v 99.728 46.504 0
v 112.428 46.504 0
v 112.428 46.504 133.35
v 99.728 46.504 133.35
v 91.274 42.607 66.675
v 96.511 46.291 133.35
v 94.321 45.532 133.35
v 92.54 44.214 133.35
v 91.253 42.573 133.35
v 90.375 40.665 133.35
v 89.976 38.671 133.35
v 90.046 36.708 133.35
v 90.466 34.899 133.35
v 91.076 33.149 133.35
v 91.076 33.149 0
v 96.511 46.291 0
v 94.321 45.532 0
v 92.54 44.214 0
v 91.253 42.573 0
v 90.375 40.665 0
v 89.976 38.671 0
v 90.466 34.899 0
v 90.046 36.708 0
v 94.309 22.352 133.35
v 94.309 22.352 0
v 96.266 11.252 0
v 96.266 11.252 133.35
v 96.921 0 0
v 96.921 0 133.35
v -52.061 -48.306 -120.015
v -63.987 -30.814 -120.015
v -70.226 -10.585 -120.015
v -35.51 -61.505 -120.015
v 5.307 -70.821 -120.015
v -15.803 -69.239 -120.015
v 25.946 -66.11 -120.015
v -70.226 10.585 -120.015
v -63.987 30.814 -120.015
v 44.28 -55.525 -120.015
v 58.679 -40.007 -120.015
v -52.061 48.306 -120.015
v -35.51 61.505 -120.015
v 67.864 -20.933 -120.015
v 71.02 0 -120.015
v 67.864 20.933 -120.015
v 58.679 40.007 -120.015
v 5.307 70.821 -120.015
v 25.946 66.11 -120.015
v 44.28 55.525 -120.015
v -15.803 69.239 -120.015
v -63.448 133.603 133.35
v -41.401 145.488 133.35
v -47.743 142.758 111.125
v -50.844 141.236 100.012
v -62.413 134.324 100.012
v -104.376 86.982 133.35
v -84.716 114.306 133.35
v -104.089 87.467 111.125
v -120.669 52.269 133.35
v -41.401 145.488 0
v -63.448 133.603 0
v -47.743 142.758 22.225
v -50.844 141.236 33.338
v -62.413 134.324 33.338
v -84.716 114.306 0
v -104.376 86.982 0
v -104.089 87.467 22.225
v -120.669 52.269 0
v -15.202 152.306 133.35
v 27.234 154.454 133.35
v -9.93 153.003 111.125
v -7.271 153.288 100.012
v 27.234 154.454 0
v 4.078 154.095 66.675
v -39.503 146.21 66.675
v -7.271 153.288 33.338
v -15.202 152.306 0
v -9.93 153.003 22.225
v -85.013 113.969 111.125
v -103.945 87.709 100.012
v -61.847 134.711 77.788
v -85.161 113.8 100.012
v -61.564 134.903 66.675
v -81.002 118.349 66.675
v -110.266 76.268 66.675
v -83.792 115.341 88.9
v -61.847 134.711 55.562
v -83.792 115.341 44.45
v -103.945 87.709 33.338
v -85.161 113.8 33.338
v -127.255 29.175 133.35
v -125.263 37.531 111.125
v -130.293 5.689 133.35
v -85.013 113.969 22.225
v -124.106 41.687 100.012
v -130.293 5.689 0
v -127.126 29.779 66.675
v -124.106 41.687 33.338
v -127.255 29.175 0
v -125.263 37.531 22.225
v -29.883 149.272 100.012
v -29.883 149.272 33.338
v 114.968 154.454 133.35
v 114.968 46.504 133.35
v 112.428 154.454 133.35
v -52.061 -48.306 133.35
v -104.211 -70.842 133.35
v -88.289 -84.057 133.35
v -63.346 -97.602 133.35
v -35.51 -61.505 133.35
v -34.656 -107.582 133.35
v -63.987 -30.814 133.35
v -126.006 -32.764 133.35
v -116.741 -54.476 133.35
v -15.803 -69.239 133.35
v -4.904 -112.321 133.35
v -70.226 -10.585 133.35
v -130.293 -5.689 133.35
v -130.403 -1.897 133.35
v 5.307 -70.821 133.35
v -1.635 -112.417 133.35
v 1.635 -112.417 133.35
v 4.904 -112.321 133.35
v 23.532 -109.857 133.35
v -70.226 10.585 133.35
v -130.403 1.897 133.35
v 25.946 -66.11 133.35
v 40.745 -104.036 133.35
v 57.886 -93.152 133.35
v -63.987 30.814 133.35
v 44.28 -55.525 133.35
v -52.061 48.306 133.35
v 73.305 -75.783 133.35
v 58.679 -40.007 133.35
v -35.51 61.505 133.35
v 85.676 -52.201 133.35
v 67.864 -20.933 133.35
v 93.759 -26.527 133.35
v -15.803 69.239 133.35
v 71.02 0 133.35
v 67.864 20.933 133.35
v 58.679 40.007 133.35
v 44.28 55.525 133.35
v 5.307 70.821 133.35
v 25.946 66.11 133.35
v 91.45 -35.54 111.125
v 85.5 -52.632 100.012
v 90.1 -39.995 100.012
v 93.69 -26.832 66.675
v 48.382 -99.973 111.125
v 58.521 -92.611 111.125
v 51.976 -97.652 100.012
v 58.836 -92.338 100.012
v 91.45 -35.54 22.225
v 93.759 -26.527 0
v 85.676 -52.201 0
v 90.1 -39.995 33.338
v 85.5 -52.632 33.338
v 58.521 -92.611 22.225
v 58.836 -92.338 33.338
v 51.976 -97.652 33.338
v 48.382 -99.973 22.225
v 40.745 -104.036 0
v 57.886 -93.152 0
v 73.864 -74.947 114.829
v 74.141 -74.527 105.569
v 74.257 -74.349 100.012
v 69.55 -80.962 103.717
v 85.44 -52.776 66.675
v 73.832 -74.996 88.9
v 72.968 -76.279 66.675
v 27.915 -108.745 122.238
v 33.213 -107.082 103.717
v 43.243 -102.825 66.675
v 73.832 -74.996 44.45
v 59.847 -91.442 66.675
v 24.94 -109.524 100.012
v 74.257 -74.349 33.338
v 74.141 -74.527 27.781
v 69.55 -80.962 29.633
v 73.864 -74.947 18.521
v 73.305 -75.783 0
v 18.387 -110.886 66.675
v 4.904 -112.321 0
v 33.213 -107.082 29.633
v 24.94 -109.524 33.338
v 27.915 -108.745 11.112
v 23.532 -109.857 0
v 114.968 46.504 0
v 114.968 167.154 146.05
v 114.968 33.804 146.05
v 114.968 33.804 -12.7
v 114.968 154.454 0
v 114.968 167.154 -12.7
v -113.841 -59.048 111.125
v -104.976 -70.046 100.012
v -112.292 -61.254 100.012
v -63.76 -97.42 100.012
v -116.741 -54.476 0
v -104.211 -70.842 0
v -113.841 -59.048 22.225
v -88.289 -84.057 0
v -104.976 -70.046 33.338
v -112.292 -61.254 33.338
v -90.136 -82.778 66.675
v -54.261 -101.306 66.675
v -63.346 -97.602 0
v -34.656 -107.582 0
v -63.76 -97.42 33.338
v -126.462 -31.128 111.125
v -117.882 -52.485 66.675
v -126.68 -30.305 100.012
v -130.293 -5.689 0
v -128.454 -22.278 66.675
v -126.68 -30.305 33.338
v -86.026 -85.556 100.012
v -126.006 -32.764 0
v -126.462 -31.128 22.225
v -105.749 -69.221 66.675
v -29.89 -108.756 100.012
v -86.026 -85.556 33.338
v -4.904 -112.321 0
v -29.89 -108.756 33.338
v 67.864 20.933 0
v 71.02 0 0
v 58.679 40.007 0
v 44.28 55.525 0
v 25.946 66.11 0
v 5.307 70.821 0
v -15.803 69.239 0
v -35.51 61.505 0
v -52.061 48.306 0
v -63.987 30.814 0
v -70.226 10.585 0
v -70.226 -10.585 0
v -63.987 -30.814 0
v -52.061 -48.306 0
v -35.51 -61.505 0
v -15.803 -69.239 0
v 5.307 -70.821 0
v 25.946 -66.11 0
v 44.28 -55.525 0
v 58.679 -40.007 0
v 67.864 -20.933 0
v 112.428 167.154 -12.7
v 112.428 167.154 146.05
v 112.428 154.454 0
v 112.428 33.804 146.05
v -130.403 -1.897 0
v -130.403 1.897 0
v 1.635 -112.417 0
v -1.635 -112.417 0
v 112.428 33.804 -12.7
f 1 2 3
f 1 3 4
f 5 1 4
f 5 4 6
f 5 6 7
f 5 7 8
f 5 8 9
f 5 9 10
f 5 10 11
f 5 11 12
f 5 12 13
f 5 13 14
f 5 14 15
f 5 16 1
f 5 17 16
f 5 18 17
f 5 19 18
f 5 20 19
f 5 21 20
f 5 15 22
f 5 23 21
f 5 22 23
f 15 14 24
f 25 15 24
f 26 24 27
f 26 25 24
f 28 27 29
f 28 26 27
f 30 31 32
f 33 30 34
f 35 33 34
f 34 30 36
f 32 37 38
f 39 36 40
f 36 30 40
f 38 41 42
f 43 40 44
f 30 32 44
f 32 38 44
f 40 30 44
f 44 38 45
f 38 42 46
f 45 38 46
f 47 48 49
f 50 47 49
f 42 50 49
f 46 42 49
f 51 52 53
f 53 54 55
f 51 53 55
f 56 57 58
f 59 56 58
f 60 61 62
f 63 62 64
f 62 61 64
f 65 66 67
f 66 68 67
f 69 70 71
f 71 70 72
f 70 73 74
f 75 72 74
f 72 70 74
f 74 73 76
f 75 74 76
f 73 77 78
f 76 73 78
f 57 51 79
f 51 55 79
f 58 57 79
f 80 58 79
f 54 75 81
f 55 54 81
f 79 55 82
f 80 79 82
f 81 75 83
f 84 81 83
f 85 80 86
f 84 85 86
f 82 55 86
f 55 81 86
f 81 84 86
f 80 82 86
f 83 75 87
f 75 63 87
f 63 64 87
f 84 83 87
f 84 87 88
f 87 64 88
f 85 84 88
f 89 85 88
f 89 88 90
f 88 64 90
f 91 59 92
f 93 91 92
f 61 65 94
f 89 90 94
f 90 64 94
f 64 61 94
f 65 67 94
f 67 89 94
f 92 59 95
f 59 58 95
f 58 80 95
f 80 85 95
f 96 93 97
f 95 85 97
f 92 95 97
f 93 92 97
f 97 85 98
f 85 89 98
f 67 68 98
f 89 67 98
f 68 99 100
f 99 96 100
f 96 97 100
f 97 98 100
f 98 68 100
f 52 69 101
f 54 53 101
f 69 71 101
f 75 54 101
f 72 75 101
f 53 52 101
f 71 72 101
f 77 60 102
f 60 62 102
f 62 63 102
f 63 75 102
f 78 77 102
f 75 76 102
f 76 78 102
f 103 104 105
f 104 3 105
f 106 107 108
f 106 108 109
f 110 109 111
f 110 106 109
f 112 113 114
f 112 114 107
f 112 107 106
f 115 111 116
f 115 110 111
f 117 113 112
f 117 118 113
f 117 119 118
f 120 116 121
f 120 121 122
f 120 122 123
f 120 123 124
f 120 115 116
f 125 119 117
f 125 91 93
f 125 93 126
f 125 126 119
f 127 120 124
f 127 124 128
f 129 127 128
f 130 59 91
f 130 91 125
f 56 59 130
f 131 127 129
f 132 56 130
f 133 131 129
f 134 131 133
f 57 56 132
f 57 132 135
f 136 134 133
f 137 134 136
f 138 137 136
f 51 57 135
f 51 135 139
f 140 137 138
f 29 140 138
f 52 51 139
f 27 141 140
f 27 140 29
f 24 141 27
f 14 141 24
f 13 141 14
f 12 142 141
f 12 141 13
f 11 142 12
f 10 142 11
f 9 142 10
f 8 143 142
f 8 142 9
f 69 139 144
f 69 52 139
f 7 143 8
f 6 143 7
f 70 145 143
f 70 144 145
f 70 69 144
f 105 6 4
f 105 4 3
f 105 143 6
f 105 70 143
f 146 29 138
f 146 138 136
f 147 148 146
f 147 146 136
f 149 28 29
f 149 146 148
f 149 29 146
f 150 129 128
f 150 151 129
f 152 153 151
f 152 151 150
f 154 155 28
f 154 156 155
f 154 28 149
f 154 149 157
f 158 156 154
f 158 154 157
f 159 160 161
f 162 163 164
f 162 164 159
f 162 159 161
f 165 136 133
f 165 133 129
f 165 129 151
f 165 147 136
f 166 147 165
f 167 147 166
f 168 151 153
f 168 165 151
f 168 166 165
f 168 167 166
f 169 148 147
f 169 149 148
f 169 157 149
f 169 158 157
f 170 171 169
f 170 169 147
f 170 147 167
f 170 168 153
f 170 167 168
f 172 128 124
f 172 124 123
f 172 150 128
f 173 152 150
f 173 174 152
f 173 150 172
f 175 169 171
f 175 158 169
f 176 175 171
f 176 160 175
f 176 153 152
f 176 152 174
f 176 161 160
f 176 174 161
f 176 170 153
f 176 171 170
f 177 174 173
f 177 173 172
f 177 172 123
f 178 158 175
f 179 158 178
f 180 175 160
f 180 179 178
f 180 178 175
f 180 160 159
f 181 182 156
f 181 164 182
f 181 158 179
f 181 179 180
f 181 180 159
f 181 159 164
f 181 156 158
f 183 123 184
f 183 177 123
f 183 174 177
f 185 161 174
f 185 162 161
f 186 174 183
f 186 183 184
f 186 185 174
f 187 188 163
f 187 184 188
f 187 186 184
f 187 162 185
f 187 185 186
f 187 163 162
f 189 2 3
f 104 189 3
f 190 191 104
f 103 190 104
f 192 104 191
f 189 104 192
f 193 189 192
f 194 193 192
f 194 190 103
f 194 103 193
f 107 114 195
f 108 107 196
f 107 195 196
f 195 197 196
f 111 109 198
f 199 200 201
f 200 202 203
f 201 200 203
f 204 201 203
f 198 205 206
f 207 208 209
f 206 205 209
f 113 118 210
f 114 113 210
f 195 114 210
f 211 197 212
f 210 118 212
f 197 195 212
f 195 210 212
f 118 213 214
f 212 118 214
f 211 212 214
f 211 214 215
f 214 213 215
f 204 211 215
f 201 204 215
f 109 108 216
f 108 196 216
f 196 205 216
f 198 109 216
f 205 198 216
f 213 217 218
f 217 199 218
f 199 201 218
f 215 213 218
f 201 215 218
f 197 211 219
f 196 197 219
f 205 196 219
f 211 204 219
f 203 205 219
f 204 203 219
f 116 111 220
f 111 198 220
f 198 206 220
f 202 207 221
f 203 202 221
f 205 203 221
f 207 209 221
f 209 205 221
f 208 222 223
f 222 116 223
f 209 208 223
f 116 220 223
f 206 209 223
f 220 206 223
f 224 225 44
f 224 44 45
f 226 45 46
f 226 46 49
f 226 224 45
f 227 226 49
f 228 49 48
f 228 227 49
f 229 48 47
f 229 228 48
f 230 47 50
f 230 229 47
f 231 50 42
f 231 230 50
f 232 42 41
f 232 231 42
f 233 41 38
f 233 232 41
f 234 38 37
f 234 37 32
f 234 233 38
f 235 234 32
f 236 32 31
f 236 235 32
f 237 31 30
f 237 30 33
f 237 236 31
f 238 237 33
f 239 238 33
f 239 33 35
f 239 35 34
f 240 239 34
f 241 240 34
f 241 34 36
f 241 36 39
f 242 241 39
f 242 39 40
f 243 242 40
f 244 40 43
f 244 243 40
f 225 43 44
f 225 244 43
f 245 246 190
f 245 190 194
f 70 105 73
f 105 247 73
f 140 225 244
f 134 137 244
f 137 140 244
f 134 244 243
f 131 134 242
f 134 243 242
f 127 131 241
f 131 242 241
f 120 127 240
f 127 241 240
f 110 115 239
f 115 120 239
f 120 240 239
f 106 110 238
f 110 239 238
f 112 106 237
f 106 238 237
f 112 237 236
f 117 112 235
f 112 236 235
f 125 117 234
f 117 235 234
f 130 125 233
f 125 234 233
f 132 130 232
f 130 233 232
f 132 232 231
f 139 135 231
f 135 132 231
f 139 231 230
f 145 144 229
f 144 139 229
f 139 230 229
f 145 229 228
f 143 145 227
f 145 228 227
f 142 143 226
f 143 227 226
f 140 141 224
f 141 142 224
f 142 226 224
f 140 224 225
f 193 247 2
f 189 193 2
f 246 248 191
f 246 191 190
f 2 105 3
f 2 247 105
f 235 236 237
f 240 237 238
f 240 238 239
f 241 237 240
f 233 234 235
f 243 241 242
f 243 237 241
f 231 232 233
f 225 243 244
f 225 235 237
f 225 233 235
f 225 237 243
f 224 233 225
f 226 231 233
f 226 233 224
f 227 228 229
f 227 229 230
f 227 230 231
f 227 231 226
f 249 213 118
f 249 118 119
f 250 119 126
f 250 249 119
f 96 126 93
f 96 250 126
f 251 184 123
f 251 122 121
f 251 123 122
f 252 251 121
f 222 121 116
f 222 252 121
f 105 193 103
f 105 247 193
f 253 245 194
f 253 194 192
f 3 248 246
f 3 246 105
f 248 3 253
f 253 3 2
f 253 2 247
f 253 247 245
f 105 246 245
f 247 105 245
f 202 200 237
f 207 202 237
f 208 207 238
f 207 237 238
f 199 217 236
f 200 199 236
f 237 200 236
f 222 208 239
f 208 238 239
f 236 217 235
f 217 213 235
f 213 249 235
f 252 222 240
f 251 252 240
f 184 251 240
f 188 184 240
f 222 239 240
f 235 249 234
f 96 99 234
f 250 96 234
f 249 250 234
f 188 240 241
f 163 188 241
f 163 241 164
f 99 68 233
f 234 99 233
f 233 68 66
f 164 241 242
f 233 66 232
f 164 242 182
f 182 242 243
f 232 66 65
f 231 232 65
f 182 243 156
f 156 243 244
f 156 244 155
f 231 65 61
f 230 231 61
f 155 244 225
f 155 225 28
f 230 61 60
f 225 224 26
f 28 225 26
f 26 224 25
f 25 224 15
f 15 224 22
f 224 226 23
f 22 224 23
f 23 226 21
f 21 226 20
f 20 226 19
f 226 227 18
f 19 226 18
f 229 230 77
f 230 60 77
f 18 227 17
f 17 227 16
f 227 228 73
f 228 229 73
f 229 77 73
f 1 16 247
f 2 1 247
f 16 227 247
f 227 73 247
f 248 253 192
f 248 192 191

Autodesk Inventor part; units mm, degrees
ref_plane "YZ Plane" through (0, 0, 0) normal (1, 0, 0) x (0, 1, 0)
ref_plane "XZ Plane" through (0, 0, 0) normal (0, 1, 0) x (-1, 0, 0)
ref_plane "XY Plane" through (0, 0, 0) normal (0, 0, 1) x (1, 0, 0)
sketch "Sketch1" plane through (0, 0, 0) normal (0, 0, 1) x (1, 0, 0)
  circle A0 centre (0, 0) radius 71.0197
  circle A1 centre (0, 0) radius 83.5526 construction
  line L0 (112.4284, 154.4541) -> (112.4284, 46.5041)
  line L1 (112.4284, 154.4541) -> (27.2344, 154.4541)
  line L2 (0, 0) -> (0, 151.2837) construction
  arc A2 (-130.2928, 5.6887) -> (-130.2928, -5.6887) centre (0, 0) ccw
  line L3 (0, 0) -> (-130.2928, 5.6887) construction
  line L4 (0, 0) -> (-130.2928, -5.6887) construction
  arc A3 (-4.9041, -112.3214) -> (4.9041, -112.3214) centre (0, 0) ccw
  line L5 (0, 0) -> (4.9041, -112.3214) construction
  line L6 (0, 0) -> (-4.9041, -112.3214) construction
  spline S0 degree 4 poles (-130.2928, -5.6887) (-129.252, -29.5283) (-115.5385, -76.6996) (-72.5309, -97.0894) (-27.6247, -111.3294) (-4.9041, -112.3214) knots 0 0 0 0 0 0.5 1 1 1 1 1
  arc A4 (96.9211, 0) -> (91.076, 33.149) centre (0, 0) ccw
  line L7 (0, 0) -> (91.076, 33.149) construction
  spline S1 degree 4 poles (96.9211, 0) (96.9211, -20.205) (85.6887, -60.6151) (67.8997, -98.9275) (26.0572, -111.3978) (4.9041, -112.3214) knots 0 0 0 0 0 0.5 1 1 1 1 1
  line L8 (112.4284, 46.5041) -> (99.7284, 46.5041)
  spline S2 degree 4 poles (99.7284, 46.5041) (97.2855, 46.5041) (92.3997, 46.5041) (88.4826, 39.817) (90.2605, 35.3895) (91.076, 33.149) knots 0 0 0 0 0 0.5 1 1 1 1 1
  line L9 (0, 0) -> (0, -253.3414) construction
  line L10 (0, 0) -> (-251.0409, 0) construction
  line L11 (0, 0) -> (96.9211, 0) construction
  line L12 (112.4284, 154.4541) -> (112.4284, 167.1541)
  line L13 (112.4284, 72.3116) -> (112.4284, 0) construction
  line L14 (0, 0) -> (27.2344, 154.4541) construction
  spline S3 degree 4 poles (27.2344, 154.4541) (-3.5458, 154.4541) (-65.1062, 154.4541) (-106.7346, 97.4701) (-128.9447, 36.5665) (-130.2928, 5.6887) knots 0 0 0 0 0 0.5 1 1 1 1 1
  line L15 (96.9211, 0) -> (112.4284, 0) construction
  line L16 (99.7284, 46.5041) -> (0, 0) construction
  line L17 (112.4284, 46.5041) -> (112.4284, 33.8041)
  line L18 (0, -112.4284) -> (163.7102, -112.4284) construction
  line L19 (112.4284, 167.1541) -> (187.2501, 167.1541) construction
  line L20 (-130.417, 0) -> (-130.417, 167.1541) construction
  line L21 (-130.417, 167.1541) -> (112.4284, 167.1541) construction
  dimension "inlet_radius" = 71.0197
  dimension "blower_wheel_radius" = 83.5526
  dimension "outlet_height" = 107.95
  dimension "d8" = 151.2837
  dimension "d13" = 130.417
  dimension "d15" = 5
  dimension "d16" = 112.4284
  dimension "d18" = 5
  dimension "d19" = 90
  dimension "d20" = 96.921
  dimension "d24" = 12.7
  dimension "d25" = 112.4284
  dimension "d26" = 12.7
  dimension "d28" = 10
  dimension "d29" = 20
  dimension "d32" = 25
  dimension "d33" = 12.7
  dimension "d39" = 279.5826
  dimension "d40" = 242.8454
extrude "Extrusion1" add sketch "Sketch1" along normal blind 133.35
sketch "Sketch2" plane through (112.4284, 46.5041, 0) normal (1, 0, 0) x (0, 0, -1)
  line L0 (0, 107.95) -> (0, 0) projected
  line L1 (0, 107.95) -> (-133.35, 107.95) projected
  line L2 (-133.35, 0) -> (-133.35, 107.95) projected
  line L3 (0, 0) -> (-133.35, 0) projected
  line L4 (-146.05, 120.65) -> (12.7, 120.65)
  line L5 (12.7, 120.65) -> (12.7, -12.7)
  line L6 (12.7, -12.7) -> (-146.05, -12.7)
  line L7 (-146.05, -12.7) -> (-146.05, 120.65)
  point P0 (0, -46.5041)
  dimension "d34" = 12.7
extrude "Extrusion2" add sketch "Sketch2" along normal blind 2.54
extrude "Extrusion3" add sketch "Sketch1" against normal blind 120.015 contours A0
sketch "Sketch3" plane through (0, 0, 0) normal (1, 0, 0) x (0, 1, 0)
  line L0 (33.149, 133.35) -> (46.5041, 133.35) projected
  line L1 (46.5041, 0) -> (46.5041, 133.35) projected
  line L2 (46.5041, 133.35) -> (154.4541, 133.35) projected
  line L3 (154.4541, 133.35) -> (154.4541, 0) projected
  line L4 (154.4541, 0) -> (46.5041, 0) projected
  line L5 (167.1541, -12.7) -> (167.1541, 146.05) projected
  line L6 (167.1541, 146.05) -> (33.8041, 146.05) projected
  line L7 (33.8041, 146.05) -> (33.8041, -12.7) projected
  line L8 (33.8041, -12.7) -> (167.1541, -12.7) projected
  line L9 (33.149, 0) -> (0, 0) projected
  line L10 (33.149, 0) -> (33.149, 133.35) projected
  line L11 (0, 133.35) -> (33.149, 133.35) projected
  line L12 (0, 0) -> (0, 133.35) projected
  line L13 (-71.0197, -120.015) -> (71.0197, -120.015) projected
  line L14 (71.0197, 0) -> (-71.0197, 0) projected
  line L15 (-112.3214, 0) -> (-112.3214, 133.35) projected
  point P0 (0, 0)
  dimension "d41" = 133.35
  dimension "d42" = 107.95
  dimension "d43" = 266.065
  dimension "d44" = 279.4755
equation "\"d33\" = d26"
equation "\"d37\" = 0.9 * outlet_width"
equation "\"spiral_factor\" = 1.16"
equation "\"blower_wheel_width\" = 80.9625"
equation "\"outlet_width\" = 133.35"
properties part number "dayton1TDT2 $167" material "Steel, Mild"
